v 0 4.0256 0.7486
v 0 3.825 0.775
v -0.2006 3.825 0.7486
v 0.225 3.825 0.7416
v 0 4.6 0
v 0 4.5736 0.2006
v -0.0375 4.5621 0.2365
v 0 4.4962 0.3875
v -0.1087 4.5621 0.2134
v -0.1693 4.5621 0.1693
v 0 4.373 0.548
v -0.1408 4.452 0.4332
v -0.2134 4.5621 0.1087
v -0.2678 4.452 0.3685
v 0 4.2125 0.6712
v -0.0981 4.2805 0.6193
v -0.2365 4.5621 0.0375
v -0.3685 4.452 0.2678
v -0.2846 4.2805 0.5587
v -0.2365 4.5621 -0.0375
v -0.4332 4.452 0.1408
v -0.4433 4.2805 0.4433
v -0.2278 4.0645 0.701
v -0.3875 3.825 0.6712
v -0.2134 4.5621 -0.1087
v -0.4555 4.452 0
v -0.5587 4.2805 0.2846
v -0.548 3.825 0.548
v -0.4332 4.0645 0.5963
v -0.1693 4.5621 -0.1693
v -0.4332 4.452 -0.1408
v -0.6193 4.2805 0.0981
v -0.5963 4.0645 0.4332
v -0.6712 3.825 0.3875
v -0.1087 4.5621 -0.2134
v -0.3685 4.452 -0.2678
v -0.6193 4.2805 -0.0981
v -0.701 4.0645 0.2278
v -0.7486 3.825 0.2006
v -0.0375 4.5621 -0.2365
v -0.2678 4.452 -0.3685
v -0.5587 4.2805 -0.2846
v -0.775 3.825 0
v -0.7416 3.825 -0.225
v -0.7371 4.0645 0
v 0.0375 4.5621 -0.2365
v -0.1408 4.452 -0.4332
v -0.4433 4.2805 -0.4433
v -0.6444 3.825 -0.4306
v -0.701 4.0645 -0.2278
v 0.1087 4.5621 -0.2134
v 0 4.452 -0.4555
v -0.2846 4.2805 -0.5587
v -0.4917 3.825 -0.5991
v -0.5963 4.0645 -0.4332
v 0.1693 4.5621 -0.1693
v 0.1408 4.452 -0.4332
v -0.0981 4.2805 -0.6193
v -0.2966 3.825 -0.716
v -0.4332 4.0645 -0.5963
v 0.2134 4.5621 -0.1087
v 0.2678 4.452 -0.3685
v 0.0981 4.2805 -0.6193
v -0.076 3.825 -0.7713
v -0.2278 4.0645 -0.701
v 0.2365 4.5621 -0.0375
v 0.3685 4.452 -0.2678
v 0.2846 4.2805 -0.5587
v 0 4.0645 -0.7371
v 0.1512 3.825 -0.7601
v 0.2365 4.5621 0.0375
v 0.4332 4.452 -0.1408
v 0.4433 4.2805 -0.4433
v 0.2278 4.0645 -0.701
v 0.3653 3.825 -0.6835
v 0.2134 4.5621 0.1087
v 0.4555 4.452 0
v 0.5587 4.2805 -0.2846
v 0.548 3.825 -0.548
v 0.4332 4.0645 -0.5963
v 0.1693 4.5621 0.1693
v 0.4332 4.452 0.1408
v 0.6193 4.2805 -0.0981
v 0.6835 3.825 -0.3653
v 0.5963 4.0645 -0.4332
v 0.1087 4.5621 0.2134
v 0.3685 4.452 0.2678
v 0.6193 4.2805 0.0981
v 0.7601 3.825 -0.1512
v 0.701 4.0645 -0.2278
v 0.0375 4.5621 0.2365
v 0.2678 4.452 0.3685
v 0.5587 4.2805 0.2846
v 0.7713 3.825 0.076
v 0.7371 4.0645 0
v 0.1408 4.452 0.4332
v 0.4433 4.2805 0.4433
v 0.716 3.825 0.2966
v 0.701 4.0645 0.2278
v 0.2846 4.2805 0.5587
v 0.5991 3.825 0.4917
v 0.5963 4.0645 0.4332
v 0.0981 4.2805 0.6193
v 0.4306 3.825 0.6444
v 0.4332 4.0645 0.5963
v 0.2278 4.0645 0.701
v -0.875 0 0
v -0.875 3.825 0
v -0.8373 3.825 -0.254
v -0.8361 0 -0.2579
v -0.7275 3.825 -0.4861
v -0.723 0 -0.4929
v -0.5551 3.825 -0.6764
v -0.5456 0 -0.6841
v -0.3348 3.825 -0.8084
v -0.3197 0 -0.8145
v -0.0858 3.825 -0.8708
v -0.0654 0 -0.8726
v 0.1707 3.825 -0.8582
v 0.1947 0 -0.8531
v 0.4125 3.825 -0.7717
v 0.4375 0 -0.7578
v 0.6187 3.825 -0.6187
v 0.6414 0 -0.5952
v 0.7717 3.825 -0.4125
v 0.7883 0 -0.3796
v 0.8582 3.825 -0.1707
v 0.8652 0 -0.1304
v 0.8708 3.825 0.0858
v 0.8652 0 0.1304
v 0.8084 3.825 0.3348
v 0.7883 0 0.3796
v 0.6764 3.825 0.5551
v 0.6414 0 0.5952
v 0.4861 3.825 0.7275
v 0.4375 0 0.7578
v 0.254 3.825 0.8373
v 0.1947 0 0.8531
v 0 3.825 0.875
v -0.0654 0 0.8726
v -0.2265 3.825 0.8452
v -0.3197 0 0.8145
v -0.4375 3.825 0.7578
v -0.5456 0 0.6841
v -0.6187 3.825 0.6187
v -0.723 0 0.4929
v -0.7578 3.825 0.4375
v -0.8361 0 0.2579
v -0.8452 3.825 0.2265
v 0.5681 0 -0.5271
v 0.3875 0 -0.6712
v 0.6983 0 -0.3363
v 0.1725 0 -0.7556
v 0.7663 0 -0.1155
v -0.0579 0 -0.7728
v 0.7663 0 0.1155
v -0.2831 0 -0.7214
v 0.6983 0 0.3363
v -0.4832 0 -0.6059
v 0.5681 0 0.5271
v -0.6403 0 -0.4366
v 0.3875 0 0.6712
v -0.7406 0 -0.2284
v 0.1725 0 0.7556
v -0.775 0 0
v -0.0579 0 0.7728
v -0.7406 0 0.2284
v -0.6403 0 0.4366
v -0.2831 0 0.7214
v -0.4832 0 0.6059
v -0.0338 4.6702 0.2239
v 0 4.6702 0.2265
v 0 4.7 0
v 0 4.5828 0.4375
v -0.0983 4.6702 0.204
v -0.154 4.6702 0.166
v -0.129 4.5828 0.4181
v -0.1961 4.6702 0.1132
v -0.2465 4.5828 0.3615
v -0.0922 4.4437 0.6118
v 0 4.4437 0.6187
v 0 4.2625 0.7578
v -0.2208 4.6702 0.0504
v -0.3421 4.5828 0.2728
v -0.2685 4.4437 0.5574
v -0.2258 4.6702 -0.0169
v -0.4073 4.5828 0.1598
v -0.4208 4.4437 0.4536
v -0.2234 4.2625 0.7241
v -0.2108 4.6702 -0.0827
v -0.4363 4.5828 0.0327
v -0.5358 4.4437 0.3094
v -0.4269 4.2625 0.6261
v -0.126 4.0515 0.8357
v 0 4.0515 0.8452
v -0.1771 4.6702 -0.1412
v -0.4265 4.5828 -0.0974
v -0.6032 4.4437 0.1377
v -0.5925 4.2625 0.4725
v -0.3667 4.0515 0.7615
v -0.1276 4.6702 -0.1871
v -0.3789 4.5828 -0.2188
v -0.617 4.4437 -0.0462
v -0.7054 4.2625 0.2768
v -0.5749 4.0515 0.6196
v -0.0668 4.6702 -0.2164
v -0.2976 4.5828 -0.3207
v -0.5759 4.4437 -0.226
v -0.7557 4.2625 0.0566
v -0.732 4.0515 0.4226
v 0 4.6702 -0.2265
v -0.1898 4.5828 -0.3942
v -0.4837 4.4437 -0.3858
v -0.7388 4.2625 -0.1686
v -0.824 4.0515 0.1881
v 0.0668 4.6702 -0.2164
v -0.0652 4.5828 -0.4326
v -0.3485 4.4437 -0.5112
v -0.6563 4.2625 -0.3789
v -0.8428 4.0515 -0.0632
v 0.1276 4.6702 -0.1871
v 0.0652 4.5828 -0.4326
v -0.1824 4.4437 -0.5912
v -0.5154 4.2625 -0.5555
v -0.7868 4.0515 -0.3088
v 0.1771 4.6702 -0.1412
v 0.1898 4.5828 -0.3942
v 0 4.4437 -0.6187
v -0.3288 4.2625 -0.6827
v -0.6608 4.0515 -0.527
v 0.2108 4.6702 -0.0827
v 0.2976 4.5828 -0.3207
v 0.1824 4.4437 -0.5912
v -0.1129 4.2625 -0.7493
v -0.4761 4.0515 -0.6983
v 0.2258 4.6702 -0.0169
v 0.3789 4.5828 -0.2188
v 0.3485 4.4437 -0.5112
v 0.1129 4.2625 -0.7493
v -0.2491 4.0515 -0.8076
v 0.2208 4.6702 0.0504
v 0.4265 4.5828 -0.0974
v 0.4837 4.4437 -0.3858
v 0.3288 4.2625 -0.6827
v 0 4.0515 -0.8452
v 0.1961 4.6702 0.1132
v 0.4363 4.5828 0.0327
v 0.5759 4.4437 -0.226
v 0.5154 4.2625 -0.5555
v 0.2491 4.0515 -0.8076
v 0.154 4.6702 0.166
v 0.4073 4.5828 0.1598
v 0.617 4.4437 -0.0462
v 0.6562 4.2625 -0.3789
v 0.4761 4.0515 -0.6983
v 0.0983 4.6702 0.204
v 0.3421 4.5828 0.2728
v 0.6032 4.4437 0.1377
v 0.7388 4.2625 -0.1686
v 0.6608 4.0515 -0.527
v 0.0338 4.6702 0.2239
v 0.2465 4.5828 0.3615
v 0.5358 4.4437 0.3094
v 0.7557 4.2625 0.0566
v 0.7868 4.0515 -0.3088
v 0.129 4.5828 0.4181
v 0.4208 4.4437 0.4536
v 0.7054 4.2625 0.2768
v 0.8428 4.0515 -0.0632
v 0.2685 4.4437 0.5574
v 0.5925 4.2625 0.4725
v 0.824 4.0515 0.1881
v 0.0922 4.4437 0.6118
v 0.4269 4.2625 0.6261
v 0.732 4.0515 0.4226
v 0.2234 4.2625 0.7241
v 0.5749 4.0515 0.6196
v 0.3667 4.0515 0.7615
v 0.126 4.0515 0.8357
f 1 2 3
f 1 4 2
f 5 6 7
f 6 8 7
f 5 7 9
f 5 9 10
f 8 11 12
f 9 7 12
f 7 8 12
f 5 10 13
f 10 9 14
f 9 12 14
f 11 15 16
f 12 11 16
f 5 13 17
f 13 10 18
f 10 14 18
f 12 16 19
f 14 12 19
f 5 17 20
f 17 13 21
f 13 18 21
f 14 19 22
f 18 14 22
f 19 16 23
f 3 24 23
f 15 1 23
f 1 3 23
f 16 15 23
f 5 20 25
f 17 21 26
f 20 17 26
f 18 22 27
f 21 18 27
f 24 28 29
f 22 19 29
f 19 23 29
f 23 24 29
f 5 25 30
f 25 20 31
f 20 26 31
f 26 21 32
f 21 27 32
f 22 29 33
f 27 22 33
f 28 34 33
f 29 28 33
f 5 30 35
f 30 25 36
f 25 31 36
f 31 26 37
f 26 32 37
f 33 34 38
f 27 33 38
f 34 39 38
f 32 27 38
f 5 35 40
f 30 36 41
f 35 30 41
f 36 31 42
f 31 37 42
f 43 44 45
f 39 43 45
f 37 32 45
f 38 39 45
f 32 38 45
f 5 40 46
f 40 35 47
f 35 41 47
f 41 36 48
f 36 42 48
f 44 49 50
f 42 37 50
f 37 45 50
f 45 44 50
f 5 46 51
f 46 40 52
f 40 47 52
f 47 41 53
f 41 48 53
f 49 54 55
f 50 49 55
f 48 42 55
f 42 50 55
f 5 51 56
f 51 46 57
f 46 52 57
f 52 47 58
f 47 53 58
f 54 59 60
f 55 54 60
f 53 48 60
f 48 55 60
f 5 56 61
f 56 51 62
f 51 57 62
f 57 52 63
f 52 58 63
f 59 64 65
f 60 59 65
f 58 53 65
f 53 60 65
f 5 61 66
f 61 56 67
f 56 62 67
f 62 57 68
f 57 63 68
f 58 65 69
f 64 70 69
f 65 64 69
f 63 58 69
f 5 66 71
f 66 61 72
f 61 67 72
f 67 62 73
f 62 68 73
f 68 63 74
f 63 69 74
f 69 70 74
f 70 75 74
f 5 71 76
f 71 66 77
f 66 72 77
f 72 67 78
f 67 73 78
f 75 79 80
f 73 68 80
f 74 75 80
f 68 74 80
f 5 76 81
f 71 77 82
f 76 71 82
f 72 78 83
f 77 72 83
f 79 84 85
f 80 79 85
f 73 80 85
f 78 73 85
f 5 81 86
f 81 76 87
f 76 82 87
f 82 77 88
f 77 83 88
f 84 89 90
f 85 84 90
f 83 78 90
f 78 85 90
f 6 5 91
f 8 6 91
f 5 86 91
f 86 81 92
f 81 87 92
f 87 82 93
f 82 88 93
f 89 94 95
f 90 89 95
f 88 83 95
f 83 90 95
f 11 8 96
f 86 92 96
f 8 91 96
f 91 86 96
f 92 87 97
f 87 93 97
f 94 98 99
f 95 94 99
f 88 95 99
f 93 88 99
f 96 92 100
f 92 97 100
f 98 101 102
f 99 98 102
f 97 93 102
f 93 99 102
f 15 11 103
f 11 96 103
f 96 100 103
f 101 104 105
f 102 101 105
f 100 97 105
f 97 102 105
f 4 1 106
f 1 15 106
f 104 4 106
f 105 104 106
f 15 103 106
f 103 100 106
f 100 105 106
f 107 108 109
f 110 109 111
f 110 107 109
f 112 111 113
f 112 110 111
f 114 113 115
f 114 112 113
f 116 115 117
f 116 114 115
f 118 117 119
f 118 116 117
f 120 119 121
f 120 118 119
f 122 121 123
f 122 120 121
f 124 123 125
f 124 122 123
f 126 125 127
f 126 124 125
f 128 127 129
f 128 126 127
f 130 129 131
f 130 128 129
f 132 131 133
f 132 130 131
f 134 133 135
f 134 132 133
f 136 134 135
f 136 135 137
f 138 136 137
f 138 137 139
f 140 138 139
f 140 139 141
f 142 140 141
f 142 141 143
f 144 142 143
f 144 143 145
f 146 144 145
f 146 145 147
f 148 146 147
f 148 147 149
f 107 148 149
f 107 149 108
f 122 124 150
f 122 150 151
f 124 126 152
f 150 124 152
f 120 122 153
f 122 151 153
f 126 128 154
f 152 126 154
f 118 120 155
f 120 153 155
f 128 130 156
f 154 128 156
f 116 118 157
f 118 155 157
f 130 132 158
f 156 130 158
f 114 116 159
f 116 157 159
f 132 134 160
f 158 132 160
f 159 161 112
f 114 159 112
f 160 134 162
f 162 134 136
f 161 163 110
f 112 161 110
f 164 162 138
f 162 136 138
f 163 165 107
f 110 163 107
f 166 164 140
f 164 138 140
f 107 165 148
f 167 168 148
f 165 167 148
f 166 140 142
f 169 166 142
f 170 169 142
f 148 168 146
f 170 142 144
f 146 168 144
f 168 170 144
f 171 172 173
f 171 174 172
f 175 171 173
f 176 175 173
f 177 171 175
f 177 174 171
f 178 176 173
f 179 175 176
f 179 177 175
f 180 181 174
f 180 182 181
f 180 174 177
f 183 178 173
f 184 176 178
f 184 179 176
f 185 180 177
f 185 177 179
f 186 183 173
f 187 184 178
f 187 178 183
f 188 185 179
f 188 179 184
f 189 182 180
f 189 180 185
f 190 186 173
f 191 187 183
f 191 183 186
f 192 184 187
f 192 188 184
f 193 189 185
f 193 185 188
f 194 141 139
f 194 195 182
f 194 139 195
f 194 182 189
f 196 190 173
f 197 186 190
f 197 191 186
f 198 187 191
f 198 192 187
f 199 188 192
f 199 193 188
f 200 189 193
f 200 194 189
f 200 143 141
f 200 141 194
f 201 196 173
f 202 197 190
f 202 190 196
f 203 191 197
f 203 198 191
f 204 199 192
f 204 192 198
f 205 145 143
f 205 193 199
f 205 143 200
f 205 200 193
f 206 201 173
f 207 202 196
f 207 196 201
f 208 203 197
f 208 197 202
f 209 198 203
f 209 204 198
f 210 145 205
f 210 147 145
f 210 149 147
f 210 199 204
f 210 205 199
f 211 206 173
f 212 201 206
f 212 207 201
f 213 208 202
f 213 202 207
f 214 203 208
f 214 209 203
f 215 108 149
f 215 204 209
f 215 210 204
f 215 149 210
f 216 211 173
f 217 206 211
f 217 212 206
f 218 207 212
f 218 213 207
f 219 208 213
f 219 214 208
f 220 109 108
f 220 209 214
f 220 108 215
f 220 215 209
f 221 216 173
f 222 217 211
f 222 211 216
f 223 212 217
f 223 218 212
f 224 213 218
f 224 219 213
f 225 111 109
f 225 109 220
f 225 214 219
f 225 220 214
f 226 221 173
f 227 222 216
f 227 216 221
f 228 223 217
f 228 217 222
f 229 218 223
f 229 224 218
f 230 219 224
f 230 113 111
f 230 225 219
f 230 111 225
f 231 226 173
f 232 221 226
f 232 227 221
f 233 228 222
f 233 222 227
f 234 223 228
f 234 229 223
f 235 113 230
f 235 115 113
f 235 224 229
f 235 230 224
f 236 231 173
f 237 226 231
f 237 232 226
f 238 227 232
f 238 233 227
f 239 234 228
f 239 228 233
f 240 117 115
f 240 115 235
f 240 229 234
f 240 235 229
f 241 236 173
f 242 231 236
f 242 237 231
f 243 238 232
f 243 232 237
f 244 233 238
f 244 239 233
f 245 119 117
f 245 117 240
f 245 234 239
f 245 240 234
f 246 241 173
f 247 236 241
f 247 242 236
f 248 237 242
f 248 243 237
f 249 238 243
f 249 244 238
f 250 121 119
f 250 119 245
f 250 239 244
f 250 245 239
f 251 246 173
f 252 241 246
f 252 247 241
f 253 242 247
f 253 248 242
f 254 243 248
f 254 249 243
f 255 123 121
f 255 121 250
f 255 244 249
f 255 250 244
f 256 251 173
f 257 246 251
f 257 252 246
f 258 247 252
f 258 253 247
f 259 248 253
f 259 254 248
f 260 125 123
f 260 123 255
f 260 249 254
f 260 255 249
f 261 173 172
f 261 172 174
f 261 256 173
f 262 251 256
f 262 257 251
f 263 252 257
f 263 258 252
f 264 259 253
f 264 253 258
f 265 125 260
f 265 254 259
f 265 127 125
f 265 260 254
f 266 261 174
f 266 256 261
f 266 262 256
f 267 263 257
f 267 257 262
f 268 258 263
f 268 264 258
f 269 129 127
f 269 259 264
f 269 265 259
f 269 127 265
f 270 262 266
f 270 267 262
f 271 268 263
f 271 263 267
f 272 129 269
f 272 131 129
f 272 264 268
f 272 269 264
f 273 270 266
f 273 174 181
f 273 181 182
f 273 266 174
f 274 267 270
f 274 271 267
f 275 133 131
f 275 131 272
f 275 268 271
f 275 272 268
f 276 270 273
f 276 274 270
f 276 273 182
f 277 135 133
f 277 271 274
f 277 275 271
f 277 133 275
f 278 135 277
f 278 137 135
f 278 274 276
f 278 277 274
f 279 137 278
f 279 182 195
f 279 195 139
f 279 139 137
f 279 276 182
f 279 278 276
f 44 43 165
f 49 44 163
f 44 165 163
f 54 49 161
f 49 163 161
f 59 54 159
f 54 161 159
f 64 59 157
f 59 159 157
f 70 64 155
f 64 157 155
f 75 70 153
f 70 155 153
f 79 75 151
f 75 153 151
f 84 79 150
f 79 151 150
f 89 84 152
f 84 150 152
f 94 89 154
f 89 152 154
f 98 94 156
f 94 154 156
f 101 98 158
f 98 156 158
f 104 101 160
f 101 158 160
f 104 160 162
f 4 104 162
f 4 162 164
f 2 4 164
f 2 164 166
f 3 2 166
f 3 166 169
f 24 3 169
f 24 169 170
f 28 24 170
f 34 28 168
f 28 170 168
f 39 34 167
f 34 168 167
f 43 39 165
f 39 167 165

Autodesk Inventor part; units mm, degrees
ref_plane "YZ Plane" through (0, 0, 0) normal (1, 0, 0) x (0, 1, 0)
ref_plane "XZ Plane" through (0, 0, 0) normal (0, 1, 0) x (-1, 0, 0)
ref_plane "XY Plane" through (0, 0, 0) normal (0, 0, 1) x (1, 0, 0)
sketch "Sketch1" plane through (0, 0, 0) normal (0, 1, 0) x (-1, 0, 0)
  circle A0 centre (0, 0) radius 0.875
  circle A1 centre (0, 0) radius 0.825
  dimension "d0" = 1.75
  dimension "d1" = 1.65
extrude "Extrusion1" add sketch "Sketch1" along normal blind 4.7 contours A0 | A1
sketch "Sketch2" plane through (0, 0, 0) normal (1, 0, 0) x (0, 1, 0)
  circle A0 centre (1.1545, 0) radius 0.3395
  line L0 (0, 0.875) -> (4.7, 0.875) projected
  line L1 (0, -0.875) -> (4.7, -0.875) projected
  line L2 (4.7, -0.875) -> (4.7, 0.875) projected
  line L3 (4.7, 0.4277) -> (3.8411, 0.4277)
  line L4 (3.825, 0) -> (3.825, -0.875)
  arc A1 (3.825, -0.875) -> (3.825, 0.875) centre (3.825, 0) ccw
  line L5 (4.7, 0.875) -> (3.825, 0.875)
  line L6 (3.825, 0.875) -> (3.825, -0.875)
  line L7 (3.825, -0.875) -> (4.7, -0.875)
  line L8 (4.7, -0.875) -> (4.7, 0.875)
  line L9 (4.7, 0) -> (2.7552, 0)
  point P0 (0, 0)
  point P1 (4.7, 0)
  dimension "d4" = 0.679
revolve "Revolution1" cut sketch "Sketch2" angle 360 about axis through (0, 4.7, 0) along (0, -1, 0) contours L0 L2 L3 A1 | L3 L2 A1
shell "Shell1" thickness 0.1 removed faces 1 at (-0.3358, 0, 0.0232)
properties part number "continuacion indice"
